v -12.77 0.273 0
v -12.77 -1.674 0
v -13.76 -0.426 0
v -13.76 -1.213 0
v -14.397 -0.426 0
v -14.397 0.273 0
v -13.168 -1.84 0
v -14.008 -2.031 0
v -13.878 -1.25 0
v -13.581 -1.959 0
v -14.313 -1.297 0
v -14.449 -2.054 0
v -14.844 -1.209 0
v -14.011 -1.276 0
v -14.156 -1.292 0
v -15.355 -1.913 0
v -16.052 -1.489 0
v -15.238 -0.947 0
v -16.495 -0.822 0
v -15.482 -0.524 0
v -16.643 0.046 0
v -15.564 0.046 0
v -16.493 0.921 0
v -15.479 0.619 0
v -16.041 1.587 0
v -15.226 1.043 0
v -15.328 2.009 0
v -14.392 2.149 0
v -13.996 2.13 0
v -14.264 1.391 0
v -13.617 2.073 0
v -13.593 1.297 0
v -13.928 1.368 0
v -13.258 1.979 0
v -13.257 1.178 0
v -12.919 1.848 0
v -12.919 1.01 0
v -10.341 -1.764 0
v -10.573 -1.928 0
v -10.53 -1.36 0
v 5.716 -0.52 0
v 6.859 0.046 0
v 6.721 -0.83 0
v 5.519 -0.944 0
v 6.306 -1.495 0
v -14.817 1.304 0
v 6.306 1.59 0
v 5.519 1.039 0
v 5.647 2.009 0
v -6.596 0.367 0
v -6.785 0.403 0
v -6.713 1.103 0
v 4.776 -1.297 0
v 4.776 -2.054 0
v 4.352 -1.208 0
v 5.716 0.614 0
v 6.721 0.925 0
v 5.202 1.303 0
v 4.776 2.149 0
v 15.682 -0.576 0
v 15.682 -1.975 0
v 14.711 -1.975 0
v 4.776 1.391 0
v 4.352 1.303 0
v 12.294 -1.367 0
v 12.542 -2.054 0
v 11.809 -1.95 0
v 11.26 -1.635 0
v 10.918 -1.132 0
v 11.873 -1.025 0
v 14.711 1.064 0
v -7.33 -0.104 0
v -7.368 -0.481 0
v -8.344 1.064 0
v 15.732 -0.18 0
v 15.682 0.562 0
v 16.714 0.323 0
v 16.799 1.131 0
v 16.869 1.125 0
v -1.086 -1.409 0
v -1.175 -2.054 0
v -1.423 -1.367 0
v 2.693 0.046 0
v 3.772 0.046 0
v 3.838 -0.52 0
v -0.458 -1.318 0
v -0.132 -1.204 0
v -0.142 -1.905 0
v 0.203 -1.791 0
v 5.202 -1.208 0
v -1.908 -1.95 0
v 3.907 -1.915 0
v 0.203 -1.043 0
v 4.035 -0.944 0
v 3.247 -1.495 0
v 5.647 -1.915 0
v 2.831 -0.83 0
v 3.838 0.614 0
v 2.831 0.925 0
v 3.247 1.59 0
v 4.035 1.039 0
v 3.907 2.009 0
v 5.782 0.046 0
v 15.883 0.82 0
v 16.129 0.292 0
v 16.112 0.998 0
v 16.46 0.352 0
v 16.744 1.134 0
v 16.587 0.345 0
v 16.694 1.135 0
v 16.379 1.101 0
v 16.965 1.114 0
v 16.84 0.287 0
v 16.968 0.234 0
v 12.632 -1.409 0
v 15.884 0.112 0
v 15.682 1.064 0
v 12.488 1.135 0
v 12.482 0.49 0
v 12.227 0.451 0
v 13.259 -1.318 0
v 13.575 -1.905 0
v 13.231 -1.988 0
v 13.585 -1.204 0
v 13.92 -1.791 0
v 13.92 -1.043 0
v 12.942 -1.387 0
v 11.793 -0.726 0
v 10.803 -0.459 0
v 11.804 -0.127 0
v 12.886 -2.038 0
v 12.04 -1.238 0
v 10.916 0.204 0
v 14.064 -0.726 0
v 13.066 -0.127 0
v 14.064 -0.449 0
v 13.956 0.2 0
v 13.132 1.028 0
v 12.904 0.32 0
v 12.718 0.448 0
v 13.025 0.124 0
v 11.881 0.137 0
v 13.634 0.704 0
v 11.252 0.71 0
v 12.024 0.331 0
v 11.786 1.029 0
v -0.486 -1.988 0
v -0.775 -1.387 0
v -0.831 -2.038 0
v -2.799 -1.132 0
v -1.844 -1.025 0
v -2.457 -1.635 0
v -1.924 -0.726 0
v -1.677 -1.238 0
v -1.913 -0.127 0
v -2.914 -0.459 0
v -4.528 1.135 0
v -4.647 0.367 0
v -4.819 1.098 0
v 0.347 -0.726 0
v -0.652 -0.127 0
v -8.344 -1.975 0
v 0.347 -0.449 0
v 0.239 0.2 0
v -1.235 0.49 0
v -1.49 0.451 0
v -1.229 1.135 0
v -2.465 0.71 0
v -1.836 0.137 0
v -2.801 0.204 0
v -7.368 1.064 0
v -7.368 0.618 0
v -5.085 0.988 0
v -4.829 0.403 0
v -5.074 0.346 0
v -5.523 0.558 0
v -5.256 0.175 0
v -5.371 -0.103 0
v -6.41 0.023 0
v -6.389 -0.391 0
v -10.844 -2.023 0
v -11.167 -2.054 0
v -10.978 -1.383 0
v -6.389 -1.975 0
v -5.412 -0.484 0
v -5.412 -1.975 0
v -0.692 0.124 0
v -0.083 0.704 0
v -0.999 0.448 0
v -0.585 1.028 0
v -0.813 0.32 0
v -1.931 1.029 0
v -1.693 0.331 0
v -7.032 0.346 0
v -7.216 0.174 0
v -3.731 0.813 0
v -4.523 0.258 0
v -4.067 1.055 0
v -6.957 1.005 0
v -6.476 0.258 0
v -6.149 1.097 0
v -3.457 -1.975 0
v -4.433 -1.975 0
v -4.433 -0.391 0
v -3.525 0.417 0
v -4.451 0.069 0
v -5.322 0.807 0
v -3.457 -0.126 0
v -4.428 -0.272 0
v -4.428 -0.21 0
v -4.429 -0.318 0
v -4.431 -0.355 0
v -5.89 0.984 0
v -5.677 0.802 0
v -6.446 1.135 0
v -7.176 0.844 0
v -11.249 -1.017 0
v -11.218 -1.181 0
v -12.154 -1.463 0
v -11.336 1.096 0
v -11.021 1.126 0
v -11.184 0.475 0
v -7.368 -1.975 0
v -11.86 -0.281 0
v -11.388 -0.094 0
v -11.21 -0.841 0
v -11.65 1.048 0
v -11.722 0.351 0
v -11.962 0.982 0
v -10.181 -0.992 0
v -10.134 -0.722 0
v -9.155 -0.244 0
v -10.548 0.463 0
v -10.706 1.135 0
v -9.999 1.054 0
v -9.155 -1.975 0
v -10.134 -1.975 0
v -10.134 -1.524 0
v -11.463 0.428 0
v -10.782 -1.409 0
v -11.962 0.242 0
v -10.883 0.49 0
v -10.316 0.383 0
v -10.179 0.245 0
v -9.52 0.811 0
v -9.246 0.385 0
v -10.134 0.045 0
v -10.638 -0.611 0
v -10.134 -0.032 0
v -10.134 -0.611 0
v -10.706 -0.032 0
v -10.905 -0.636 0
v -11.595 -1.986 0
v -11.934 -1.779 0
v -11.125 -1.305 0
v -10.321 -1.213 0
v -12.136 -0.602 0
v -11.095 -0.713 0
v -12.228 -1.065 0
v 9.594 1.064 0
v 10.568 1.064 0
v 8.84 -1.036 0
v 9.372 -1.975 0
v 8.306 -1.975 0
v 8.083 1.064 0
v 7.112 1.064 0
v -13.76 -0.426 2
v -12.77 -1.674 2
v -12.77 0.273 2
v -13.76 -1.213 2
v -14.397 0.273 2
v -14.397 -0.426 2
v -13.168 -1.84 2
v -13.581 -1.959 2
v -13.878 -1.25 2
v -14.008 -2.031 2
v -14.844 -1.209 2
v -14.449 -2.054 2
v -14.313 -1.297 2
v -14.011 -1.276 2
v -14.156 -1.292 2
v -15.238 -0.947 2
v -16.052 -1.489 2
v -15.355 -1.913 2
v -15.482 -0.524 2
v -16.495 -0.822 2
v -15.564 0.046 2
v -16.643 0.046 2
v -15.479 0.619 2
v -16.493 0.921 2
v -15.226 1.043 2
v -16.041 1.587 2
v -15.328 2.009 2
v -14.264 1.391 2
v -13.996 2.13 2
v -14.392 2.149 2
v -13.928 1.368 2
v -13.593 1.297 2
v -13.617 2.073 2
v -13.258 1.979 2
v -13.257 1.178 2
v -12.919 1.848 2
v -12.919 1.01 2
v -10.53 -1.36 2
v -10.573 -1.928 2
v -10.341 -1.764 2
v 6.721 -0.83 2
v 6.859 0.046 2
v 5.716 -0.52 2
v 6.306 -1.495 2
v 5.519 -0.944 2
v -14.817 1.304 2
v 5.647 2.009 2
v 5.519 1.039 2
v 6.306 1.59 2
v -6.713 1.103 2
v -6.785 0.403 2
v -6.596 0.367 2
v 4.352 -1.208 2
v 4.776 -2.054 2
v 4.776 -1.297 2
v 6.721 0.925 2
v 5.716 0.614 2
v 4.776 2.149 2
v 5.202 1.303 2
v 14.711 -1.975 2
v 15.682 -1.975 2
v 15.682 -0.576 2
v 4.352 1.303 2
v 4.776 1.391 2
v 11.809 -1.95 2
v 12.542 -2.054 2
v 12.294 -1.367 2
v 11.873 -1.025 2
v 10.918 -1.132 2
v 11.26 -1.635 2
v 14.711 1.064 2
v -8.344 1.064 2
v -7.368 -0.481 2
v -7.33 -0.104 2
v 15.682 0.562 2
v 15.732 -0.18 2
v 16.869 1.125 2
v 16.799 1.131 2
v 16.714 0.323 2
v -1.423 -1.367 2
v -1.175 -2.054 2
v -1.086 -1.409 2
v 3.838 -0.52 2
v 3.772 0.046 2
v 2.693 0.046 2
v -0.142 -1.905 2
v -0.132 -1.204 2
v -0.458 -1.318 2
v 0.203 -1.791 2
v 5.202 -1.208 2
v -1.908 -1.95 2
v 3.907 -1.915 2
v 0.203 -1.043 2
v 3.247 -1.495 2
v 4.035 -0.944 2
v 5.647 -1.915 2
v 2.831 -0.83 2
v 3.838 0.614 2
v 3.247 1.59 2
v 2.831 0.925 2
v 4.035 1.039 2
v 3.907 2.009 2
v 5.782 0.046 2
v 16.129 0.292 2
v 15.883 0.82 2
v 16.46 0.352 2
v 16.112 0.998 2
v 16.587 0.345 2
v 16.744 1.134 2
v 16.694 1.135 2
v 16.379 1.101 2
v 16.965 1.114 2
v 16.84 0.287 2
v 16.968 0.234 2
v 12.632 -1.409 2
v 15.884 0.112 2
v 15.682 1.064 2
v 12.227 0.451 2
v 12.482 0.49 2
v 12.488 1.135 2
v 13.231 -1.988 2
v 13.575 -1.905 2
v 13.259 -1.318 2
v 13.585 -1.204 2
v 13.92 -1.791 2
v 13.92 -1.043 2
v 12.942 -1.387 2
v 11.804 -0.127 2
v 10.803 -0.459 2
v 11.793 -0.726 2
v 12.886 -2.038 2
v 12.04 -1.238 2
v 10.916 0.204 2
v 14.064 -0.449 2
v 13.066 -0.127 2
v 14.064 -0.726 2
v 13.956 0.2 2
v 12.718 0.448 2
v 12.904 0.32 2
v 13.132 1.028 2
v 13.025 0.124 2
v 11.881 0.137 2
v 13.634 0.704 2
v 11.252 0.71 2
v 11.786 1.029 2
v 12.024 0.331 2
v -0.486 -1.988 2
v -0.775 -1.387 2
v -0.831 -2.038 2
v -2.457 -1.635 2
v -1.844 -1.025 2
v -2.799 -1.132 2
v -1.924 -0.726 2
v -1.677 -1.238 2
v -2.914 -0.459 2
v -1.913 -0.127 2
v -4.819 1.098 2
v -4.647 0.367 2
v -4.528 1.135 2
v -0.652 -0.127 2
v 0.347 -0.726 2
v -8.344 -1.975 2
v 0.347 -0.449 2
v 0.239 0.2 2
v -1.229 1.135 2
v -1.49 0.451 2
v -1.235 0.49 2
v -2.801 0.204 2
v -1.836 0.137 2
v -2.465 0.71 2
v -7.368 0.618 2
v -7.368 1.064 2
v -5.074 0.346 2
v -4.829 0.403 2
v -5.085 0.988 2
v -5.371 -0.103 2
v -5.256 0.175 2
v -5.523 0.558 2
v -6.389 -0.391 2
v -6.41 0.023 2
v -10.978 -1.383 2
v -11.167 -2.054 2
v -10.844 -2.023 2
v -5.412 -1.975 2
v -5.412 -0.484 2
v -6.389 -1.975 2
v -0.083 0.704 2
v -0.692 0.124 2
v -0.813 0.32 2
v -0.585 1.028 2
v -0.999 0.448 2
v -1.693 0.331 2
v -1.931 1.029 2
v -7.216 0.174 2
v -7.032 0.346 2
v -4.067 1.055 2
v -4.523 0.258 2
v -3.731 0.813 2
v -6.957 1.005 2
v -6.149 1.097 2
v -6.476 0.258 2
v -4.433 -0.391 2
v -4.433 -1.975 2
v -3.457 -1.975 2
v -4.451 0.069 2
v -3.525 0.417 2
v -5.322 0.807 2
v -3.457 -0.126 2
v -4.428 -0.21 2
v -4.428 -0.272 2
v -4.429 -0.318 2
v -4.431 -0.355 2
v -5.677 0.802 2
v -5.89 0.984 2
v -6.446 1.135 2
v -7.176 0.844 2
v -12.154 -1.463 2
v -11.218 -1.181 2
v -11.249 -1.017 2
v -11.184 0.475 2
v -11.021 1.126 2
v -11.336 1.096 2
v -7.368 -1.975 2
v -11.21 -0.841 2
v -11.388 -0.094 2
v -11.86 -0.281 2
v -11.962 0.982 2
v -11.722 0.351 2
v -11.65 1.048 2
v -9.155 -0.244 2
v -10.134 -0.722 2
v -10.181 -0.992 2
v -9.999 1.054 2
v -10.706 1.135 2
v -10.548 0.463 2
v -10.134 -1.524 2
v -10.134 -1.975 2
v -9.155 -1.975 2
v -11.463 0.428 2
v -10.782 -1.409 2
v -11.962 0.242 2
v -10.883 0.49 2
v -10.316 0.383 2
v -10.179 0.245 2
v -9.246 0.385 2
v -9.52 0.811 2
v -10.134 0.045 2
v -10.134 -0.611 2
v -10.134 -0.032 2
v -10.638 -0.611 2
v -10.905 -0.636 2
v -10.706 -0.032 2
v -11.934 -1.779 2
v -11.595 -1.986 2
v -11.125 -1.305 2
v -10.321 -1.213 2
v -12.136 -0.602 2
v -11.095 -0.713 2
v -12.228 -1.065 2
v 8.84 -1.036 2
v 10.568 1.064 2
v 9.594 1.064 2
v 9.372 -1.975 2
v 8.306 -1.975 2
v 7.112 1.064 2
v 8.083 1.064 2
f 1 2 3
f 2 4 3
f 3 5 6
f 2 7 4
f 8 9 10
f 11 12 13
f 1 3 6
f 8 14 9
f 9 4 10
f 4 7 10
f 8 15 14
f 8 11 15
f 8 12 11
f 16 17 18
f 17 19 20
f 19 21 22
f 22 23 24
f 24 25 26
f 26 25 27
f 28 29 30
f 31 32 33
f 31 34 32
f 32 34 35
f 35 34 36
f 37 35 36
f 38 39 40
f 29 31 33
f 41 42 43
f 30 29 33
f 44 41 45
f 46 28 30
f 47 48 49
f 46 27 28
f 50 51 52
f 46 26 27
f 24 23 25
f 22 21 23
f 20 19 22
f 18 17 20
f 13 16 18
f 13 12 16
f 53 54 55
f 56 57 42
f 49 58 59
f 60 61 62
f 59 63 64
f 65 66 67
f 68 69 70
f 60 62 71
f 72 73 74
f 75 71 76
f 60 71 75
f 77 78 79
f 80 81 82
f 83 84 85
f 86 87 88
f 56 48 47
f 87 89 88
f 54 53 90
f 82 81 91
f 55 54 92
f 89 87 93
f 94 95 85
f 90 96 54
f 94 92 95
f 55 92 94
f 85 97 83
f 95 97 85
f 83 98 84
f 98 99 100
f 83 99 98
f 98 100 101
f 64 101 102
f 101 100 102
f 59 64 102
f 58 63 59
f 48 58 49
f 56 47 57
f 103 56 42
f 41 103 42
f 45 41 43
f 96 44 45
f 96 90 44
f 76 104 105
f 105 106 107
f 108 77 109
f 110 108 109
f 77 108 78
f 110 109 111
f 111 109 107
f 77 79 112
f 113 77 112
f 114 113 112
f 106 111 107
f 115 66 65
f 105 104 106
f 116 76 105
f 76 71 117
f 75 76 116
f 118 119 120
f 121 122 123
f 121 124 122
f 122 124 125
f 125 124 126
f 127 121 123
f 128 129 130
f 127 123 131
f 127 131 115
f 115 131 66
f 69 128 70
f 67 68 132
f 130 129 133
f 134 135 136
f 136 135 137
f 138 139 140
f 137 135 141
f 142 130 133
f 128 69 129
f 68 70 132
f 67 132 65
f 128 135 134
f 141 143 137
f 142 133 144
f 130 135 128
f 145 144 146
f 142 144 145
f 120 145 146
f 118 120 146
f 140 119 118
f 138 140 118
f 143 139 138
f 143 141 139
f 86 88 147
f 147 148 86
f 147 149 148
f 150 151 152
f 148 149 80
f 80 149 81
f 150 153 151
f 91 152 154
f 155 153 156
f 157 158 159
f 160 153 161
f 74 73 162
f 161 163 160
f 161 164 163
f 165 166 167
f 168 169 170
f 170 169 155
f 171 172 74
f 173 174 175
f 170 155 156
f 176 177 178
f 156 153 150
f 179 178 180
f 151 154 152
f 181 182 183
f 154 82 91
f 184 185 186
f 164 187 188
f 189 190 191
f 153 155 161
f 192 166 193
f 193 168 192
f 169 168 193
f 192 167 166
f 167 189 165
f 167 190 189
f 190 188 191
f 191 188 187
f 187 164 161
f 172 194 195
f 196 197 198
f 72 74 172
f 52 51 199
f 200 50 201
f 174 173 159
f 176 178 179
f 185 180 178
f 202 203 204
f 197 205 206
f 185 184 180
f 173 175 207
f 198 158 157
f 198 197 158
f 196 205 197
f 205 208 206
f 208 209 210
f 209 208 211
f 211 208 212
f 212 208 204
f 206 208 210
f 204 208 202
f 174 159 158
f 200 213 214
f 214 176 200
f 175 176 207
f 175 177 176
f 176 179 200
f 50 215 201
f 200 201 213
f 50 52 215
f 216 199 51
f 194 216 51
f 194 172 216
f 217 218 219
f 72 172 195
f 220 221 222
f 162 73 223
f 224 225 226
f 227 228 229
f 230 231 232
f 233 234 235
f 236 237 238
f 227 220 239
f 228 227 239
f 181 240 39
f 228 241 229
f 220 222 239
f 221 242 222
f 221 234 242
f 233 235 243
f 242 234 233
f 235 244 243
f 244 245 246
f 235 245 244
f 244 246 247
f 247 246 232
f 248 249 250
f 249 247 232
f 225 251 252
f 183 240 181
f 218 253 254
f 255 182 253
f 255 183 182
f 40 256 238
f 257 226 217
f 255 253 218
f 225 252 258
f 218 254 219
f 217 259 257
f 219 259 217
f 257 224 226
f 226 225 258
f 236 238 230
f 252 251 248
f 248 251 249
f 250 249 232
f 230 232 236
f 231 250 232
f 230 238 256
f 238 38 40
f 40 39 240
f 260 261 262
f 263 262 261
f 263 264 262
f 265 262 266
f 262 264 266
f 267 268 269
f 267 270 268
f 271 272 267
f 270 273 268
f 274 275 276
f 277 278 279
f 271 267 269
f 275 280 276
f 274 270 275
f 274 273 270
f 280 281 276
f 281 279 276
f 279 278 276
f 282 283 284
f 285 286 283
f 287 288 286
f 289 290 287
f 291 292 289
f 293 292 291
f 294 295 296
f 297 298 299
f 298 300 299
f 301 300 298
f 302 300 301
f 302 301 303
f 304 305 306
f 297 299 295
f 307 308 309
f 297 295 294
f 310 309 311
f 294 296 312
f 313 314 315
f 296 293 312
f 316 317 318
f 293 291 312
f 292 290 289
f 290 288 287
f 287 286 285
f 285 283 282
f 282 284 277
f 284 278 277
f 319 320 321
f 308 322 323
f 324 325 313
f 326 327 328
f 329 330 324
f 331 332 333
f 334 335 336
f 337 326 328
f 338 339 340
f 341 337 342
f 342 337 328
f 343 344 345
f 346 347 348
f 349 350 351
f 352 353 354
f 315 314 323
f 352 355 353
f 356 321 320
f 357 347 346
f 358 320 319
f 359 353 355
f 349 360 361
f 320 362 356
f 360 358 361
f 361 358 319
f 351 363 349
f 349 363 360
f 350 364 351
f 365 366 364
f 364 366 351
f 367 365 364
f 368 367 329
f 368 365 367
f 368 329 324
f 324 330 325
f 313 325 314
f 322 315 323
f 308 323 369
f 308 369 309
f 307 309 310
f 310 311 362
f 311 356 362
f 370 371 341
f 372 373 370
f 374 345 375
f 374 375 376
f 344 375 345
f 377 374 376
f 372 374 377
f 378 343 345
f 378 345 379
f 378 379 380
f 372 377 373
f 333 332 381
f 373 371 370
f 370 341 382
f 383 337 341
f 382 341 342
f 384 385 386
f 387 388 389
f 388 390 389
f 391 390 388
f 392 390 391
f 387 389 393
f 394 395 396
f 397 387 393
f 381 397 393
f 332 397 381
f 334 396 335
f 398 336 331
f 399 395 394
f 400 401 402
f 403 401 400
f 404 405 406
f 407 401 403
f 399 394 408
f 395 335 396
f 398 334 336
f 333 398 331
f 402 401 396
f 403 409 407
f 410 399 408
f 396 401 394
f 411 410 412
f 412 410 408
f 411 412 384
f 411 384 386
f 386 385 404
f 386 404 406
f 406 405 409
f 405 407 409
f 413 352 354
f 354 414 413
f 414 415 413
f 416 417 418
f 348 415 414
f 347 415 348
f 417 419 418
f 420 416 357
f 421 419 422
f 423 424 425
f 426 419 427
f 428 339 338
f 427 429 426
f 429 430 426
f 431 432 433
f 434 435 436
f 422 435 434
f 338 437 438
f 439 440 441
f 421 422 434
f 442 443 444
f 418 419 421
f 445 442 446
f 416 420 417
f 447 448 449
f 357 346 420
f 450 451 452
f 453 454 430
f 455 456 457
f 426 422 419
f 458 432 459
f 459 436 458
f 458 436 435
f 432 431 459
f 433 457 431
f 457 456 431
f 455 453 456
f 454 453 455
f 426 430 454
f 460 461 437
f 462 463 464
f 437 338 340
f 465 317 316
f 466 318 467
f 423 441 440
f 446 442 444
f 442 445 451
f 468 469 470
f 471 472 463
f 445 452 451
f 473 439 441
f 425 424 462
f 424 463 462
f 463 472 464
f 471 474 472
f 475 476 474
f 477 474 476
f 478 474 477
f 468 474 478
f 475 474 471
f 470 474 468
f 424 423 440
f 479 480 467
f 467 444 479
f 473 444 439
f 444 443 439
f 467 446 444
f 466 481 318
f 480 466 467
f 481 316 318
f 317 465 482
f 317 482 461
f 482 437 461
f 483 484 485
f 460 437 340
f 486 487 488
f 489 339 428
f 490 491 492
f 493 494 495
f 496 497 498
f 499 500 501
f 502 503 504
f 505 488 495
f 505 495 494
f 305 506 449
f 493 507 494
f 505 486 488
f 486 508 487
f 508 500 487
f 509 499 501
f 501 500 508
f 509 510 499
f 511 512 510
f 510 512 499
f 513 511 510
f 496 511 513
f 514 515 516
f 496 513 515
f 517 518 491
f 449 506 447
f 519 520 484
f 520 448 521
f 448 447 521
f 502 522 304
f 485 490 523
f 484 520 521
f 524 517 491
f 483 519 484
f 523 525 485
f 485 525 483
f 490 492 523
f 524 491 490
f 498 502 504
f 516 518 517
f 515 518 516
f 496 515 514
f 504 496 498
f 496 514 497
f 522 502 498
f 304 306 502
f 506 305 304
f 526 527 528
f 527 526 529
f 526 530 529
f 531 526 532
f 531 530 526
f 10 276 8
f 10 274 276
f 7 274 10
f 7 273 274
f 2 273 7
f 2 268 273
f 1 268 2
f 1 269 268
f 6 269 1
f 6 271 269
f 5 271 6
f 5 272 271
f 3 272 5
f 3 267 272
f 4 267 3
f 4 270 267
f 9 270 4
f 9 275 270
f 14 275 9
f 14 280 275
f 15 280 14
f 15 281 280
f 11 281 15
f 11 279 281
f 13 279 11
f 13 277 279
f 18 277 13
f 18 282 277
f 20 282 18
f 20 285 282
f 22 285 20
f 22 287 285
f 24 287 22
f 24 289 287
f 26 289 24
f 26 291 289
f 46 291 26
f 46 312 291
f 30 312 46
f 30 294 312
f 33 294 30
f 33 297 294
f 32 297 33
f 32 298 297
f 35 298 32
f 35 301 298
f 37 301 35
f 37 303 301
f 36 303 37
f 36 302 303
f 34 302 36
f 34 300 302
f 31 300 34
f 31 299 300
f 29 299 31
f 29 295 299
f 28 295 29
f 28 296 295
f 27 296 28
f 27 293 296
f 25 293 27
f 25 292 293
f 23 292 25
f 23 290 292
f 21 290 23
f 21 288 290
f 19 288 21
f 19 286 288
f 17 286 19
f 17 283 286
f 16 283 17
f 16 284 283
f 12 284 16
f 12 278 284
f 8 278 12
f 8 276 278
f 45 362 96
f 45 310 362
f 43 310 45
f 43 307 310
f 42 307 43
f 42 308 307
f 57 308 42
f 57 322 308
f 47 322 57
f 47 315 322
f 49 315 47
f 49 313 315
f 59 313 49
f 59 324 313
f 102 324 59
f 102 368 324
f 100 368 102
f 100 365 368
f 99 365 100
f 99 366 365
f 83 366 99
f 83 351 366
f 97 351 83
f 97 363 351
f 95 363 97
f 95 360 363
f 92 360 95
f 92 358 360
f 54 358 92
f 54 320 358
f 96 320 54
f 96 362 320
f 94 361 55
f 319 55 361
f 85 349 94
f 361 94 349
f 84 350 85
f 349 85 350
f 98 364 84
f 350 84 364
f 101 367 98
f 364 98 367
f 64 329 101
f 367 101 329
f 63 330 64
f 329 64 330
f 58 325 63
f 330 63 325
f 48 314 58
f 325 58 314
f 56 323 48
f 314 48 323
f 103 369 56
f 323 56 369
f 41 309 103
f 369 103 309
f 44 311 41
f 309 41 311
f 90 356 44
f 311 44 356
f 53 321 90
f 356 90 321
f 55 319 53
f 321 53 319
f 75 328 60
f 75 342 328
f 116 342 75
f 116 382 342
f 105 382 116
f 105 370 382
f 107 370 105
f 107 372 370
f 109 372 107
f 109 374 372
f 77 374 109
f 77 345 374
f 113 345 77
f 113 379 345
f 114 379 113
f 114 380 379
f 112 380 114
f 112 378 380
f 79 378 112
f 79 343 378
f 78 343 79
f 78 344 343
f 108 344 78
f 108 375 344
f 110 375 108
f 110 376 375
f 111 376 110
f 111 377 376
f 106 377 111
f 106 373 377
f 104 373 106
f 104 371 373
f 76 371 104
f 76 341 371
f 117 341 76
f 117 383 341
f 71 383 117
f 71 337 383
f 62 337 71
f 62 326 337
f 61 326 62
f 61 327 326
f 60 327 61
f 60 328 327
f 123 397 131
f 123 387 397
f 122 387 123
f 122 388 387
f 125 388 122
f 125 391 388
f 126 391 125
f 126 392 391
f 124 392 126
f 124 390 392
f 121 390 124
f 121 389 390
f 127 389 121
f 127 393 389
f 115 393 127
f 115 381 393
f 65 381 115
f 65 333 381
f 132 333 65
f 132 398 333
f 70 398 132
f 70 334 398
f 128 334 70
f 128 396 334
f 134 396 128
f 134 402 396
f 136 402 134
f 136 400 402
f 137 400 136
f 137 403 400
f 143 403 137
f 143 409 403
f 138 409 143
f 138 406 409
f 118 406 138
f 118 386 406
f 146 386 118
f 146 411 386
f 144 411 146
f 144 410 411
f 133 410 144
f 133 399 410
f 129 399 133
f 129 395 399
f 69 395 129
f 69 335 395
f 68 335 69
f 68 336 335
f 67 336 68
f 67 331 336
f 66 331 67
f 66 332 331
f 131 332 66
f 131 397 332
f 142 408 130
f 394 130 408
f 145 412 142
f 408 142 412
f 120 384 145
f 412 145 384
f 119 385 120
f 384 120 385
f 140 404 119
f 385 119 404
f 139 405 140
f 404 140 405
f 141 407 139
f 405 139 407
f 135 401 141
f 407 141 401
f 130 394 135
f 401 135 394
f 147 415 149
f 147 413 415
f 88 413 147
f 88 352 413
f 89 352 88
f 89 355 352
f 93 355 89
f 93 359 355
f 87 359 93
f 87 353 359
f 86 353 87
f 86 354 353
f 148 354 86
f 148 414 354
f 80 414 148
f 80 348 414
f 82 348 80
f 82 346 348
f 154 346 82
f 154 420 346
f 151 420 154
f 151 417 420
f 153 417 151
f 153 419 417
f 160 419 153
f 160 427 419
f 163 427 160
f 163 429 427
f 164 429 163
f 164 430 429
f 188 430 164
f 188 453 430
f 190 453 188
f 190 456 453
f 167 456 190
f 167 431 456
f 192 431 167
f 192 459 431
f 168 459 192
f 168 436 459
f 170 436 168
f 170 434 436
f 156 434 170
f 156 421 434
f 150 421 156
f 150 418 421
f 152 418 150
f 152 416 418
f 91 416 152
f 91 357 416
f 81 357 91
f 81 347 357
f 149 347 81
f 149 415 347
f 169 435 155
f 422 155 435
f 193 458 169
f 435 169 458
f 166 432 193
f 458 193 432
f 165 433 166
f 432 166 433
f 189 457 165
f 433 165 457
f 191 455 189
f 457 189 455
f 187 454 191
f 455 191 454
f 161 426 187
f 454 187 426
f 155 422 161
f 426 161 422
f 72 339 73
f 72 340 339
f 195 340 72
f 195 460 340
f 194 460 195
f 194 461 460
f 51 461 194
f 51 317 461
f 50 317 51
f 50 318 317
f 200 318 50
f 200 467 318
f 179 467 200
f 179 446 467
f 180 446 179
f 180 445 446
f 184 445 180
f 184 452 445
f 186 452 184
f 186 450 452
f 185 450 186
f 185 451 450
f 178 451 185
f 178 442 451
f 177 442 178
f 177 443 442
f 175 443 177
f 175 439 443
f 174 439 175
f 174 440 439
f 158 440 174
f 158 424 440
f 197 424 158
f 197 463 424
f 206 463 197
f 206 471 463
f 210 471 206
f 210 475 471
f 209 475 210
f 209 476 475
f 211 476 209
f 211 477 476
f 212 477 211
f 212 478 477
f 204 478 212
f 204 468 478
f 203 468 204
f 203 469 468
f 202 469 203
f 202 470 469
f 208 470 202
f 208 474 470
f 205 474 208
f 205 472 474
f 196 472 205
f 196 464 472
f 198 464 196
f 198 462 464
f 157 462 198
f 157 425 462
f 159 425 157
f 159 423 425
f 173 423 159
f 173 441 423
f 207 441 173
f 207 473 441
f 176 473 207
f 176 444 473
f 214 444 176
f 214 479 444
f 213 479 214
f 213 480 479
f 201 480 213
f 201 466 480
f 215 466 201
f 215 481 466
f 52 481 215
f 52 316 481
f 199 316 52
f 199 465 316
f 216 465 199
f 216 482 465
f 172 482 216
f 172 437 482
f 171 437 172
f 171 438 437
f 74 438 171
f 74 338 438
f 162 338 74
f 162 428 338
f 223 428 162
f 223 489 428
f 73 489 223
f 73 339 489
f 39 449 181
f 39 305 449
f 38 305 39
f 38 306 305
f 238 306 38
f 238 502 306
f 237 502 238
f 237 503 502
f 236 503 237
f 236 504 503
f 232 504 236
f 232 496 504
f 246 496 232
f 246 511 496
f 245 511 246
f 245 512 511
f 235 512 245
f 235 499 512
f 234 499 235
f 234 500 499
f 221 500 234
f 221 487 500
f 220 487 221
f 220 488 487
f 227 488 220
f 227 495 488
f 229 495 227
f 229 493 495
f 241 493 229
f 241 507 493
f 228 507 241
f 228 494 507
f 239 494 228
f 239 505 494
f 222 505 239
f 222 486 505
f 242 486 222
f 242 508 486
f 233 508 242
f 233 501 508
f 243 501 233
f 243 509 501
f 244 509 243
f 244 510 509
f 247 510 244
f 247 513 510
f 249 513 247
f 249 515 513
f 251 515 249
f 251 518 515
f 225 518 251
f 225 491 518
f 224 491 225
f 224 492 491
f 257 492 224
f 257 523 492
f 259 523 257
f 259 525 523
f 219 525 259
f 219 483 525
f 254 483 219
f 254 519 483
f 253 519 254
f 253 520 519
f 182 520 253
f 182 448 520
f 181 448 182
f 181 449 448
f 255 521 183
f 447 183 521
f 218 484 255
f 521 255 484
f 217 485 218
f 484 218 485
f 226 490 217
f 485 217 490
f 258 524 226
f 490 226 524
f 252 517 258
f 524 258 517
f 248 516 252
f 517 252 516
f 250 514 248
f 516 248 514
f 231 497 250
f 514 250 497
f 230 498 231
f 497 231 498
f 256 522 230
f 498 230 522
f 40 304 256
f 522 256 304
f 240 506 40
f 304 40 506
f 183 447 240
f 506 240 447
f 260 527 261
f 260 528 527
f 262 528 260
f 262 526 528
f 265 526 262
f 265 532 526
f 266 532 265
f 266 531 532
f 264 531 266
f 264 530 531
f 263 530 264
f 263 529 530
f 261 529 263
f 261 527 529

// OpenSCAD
linear_extrude(2)
text("Game Over", font="Verdana:style=Bold", size=4, valign="center", halign="center");
